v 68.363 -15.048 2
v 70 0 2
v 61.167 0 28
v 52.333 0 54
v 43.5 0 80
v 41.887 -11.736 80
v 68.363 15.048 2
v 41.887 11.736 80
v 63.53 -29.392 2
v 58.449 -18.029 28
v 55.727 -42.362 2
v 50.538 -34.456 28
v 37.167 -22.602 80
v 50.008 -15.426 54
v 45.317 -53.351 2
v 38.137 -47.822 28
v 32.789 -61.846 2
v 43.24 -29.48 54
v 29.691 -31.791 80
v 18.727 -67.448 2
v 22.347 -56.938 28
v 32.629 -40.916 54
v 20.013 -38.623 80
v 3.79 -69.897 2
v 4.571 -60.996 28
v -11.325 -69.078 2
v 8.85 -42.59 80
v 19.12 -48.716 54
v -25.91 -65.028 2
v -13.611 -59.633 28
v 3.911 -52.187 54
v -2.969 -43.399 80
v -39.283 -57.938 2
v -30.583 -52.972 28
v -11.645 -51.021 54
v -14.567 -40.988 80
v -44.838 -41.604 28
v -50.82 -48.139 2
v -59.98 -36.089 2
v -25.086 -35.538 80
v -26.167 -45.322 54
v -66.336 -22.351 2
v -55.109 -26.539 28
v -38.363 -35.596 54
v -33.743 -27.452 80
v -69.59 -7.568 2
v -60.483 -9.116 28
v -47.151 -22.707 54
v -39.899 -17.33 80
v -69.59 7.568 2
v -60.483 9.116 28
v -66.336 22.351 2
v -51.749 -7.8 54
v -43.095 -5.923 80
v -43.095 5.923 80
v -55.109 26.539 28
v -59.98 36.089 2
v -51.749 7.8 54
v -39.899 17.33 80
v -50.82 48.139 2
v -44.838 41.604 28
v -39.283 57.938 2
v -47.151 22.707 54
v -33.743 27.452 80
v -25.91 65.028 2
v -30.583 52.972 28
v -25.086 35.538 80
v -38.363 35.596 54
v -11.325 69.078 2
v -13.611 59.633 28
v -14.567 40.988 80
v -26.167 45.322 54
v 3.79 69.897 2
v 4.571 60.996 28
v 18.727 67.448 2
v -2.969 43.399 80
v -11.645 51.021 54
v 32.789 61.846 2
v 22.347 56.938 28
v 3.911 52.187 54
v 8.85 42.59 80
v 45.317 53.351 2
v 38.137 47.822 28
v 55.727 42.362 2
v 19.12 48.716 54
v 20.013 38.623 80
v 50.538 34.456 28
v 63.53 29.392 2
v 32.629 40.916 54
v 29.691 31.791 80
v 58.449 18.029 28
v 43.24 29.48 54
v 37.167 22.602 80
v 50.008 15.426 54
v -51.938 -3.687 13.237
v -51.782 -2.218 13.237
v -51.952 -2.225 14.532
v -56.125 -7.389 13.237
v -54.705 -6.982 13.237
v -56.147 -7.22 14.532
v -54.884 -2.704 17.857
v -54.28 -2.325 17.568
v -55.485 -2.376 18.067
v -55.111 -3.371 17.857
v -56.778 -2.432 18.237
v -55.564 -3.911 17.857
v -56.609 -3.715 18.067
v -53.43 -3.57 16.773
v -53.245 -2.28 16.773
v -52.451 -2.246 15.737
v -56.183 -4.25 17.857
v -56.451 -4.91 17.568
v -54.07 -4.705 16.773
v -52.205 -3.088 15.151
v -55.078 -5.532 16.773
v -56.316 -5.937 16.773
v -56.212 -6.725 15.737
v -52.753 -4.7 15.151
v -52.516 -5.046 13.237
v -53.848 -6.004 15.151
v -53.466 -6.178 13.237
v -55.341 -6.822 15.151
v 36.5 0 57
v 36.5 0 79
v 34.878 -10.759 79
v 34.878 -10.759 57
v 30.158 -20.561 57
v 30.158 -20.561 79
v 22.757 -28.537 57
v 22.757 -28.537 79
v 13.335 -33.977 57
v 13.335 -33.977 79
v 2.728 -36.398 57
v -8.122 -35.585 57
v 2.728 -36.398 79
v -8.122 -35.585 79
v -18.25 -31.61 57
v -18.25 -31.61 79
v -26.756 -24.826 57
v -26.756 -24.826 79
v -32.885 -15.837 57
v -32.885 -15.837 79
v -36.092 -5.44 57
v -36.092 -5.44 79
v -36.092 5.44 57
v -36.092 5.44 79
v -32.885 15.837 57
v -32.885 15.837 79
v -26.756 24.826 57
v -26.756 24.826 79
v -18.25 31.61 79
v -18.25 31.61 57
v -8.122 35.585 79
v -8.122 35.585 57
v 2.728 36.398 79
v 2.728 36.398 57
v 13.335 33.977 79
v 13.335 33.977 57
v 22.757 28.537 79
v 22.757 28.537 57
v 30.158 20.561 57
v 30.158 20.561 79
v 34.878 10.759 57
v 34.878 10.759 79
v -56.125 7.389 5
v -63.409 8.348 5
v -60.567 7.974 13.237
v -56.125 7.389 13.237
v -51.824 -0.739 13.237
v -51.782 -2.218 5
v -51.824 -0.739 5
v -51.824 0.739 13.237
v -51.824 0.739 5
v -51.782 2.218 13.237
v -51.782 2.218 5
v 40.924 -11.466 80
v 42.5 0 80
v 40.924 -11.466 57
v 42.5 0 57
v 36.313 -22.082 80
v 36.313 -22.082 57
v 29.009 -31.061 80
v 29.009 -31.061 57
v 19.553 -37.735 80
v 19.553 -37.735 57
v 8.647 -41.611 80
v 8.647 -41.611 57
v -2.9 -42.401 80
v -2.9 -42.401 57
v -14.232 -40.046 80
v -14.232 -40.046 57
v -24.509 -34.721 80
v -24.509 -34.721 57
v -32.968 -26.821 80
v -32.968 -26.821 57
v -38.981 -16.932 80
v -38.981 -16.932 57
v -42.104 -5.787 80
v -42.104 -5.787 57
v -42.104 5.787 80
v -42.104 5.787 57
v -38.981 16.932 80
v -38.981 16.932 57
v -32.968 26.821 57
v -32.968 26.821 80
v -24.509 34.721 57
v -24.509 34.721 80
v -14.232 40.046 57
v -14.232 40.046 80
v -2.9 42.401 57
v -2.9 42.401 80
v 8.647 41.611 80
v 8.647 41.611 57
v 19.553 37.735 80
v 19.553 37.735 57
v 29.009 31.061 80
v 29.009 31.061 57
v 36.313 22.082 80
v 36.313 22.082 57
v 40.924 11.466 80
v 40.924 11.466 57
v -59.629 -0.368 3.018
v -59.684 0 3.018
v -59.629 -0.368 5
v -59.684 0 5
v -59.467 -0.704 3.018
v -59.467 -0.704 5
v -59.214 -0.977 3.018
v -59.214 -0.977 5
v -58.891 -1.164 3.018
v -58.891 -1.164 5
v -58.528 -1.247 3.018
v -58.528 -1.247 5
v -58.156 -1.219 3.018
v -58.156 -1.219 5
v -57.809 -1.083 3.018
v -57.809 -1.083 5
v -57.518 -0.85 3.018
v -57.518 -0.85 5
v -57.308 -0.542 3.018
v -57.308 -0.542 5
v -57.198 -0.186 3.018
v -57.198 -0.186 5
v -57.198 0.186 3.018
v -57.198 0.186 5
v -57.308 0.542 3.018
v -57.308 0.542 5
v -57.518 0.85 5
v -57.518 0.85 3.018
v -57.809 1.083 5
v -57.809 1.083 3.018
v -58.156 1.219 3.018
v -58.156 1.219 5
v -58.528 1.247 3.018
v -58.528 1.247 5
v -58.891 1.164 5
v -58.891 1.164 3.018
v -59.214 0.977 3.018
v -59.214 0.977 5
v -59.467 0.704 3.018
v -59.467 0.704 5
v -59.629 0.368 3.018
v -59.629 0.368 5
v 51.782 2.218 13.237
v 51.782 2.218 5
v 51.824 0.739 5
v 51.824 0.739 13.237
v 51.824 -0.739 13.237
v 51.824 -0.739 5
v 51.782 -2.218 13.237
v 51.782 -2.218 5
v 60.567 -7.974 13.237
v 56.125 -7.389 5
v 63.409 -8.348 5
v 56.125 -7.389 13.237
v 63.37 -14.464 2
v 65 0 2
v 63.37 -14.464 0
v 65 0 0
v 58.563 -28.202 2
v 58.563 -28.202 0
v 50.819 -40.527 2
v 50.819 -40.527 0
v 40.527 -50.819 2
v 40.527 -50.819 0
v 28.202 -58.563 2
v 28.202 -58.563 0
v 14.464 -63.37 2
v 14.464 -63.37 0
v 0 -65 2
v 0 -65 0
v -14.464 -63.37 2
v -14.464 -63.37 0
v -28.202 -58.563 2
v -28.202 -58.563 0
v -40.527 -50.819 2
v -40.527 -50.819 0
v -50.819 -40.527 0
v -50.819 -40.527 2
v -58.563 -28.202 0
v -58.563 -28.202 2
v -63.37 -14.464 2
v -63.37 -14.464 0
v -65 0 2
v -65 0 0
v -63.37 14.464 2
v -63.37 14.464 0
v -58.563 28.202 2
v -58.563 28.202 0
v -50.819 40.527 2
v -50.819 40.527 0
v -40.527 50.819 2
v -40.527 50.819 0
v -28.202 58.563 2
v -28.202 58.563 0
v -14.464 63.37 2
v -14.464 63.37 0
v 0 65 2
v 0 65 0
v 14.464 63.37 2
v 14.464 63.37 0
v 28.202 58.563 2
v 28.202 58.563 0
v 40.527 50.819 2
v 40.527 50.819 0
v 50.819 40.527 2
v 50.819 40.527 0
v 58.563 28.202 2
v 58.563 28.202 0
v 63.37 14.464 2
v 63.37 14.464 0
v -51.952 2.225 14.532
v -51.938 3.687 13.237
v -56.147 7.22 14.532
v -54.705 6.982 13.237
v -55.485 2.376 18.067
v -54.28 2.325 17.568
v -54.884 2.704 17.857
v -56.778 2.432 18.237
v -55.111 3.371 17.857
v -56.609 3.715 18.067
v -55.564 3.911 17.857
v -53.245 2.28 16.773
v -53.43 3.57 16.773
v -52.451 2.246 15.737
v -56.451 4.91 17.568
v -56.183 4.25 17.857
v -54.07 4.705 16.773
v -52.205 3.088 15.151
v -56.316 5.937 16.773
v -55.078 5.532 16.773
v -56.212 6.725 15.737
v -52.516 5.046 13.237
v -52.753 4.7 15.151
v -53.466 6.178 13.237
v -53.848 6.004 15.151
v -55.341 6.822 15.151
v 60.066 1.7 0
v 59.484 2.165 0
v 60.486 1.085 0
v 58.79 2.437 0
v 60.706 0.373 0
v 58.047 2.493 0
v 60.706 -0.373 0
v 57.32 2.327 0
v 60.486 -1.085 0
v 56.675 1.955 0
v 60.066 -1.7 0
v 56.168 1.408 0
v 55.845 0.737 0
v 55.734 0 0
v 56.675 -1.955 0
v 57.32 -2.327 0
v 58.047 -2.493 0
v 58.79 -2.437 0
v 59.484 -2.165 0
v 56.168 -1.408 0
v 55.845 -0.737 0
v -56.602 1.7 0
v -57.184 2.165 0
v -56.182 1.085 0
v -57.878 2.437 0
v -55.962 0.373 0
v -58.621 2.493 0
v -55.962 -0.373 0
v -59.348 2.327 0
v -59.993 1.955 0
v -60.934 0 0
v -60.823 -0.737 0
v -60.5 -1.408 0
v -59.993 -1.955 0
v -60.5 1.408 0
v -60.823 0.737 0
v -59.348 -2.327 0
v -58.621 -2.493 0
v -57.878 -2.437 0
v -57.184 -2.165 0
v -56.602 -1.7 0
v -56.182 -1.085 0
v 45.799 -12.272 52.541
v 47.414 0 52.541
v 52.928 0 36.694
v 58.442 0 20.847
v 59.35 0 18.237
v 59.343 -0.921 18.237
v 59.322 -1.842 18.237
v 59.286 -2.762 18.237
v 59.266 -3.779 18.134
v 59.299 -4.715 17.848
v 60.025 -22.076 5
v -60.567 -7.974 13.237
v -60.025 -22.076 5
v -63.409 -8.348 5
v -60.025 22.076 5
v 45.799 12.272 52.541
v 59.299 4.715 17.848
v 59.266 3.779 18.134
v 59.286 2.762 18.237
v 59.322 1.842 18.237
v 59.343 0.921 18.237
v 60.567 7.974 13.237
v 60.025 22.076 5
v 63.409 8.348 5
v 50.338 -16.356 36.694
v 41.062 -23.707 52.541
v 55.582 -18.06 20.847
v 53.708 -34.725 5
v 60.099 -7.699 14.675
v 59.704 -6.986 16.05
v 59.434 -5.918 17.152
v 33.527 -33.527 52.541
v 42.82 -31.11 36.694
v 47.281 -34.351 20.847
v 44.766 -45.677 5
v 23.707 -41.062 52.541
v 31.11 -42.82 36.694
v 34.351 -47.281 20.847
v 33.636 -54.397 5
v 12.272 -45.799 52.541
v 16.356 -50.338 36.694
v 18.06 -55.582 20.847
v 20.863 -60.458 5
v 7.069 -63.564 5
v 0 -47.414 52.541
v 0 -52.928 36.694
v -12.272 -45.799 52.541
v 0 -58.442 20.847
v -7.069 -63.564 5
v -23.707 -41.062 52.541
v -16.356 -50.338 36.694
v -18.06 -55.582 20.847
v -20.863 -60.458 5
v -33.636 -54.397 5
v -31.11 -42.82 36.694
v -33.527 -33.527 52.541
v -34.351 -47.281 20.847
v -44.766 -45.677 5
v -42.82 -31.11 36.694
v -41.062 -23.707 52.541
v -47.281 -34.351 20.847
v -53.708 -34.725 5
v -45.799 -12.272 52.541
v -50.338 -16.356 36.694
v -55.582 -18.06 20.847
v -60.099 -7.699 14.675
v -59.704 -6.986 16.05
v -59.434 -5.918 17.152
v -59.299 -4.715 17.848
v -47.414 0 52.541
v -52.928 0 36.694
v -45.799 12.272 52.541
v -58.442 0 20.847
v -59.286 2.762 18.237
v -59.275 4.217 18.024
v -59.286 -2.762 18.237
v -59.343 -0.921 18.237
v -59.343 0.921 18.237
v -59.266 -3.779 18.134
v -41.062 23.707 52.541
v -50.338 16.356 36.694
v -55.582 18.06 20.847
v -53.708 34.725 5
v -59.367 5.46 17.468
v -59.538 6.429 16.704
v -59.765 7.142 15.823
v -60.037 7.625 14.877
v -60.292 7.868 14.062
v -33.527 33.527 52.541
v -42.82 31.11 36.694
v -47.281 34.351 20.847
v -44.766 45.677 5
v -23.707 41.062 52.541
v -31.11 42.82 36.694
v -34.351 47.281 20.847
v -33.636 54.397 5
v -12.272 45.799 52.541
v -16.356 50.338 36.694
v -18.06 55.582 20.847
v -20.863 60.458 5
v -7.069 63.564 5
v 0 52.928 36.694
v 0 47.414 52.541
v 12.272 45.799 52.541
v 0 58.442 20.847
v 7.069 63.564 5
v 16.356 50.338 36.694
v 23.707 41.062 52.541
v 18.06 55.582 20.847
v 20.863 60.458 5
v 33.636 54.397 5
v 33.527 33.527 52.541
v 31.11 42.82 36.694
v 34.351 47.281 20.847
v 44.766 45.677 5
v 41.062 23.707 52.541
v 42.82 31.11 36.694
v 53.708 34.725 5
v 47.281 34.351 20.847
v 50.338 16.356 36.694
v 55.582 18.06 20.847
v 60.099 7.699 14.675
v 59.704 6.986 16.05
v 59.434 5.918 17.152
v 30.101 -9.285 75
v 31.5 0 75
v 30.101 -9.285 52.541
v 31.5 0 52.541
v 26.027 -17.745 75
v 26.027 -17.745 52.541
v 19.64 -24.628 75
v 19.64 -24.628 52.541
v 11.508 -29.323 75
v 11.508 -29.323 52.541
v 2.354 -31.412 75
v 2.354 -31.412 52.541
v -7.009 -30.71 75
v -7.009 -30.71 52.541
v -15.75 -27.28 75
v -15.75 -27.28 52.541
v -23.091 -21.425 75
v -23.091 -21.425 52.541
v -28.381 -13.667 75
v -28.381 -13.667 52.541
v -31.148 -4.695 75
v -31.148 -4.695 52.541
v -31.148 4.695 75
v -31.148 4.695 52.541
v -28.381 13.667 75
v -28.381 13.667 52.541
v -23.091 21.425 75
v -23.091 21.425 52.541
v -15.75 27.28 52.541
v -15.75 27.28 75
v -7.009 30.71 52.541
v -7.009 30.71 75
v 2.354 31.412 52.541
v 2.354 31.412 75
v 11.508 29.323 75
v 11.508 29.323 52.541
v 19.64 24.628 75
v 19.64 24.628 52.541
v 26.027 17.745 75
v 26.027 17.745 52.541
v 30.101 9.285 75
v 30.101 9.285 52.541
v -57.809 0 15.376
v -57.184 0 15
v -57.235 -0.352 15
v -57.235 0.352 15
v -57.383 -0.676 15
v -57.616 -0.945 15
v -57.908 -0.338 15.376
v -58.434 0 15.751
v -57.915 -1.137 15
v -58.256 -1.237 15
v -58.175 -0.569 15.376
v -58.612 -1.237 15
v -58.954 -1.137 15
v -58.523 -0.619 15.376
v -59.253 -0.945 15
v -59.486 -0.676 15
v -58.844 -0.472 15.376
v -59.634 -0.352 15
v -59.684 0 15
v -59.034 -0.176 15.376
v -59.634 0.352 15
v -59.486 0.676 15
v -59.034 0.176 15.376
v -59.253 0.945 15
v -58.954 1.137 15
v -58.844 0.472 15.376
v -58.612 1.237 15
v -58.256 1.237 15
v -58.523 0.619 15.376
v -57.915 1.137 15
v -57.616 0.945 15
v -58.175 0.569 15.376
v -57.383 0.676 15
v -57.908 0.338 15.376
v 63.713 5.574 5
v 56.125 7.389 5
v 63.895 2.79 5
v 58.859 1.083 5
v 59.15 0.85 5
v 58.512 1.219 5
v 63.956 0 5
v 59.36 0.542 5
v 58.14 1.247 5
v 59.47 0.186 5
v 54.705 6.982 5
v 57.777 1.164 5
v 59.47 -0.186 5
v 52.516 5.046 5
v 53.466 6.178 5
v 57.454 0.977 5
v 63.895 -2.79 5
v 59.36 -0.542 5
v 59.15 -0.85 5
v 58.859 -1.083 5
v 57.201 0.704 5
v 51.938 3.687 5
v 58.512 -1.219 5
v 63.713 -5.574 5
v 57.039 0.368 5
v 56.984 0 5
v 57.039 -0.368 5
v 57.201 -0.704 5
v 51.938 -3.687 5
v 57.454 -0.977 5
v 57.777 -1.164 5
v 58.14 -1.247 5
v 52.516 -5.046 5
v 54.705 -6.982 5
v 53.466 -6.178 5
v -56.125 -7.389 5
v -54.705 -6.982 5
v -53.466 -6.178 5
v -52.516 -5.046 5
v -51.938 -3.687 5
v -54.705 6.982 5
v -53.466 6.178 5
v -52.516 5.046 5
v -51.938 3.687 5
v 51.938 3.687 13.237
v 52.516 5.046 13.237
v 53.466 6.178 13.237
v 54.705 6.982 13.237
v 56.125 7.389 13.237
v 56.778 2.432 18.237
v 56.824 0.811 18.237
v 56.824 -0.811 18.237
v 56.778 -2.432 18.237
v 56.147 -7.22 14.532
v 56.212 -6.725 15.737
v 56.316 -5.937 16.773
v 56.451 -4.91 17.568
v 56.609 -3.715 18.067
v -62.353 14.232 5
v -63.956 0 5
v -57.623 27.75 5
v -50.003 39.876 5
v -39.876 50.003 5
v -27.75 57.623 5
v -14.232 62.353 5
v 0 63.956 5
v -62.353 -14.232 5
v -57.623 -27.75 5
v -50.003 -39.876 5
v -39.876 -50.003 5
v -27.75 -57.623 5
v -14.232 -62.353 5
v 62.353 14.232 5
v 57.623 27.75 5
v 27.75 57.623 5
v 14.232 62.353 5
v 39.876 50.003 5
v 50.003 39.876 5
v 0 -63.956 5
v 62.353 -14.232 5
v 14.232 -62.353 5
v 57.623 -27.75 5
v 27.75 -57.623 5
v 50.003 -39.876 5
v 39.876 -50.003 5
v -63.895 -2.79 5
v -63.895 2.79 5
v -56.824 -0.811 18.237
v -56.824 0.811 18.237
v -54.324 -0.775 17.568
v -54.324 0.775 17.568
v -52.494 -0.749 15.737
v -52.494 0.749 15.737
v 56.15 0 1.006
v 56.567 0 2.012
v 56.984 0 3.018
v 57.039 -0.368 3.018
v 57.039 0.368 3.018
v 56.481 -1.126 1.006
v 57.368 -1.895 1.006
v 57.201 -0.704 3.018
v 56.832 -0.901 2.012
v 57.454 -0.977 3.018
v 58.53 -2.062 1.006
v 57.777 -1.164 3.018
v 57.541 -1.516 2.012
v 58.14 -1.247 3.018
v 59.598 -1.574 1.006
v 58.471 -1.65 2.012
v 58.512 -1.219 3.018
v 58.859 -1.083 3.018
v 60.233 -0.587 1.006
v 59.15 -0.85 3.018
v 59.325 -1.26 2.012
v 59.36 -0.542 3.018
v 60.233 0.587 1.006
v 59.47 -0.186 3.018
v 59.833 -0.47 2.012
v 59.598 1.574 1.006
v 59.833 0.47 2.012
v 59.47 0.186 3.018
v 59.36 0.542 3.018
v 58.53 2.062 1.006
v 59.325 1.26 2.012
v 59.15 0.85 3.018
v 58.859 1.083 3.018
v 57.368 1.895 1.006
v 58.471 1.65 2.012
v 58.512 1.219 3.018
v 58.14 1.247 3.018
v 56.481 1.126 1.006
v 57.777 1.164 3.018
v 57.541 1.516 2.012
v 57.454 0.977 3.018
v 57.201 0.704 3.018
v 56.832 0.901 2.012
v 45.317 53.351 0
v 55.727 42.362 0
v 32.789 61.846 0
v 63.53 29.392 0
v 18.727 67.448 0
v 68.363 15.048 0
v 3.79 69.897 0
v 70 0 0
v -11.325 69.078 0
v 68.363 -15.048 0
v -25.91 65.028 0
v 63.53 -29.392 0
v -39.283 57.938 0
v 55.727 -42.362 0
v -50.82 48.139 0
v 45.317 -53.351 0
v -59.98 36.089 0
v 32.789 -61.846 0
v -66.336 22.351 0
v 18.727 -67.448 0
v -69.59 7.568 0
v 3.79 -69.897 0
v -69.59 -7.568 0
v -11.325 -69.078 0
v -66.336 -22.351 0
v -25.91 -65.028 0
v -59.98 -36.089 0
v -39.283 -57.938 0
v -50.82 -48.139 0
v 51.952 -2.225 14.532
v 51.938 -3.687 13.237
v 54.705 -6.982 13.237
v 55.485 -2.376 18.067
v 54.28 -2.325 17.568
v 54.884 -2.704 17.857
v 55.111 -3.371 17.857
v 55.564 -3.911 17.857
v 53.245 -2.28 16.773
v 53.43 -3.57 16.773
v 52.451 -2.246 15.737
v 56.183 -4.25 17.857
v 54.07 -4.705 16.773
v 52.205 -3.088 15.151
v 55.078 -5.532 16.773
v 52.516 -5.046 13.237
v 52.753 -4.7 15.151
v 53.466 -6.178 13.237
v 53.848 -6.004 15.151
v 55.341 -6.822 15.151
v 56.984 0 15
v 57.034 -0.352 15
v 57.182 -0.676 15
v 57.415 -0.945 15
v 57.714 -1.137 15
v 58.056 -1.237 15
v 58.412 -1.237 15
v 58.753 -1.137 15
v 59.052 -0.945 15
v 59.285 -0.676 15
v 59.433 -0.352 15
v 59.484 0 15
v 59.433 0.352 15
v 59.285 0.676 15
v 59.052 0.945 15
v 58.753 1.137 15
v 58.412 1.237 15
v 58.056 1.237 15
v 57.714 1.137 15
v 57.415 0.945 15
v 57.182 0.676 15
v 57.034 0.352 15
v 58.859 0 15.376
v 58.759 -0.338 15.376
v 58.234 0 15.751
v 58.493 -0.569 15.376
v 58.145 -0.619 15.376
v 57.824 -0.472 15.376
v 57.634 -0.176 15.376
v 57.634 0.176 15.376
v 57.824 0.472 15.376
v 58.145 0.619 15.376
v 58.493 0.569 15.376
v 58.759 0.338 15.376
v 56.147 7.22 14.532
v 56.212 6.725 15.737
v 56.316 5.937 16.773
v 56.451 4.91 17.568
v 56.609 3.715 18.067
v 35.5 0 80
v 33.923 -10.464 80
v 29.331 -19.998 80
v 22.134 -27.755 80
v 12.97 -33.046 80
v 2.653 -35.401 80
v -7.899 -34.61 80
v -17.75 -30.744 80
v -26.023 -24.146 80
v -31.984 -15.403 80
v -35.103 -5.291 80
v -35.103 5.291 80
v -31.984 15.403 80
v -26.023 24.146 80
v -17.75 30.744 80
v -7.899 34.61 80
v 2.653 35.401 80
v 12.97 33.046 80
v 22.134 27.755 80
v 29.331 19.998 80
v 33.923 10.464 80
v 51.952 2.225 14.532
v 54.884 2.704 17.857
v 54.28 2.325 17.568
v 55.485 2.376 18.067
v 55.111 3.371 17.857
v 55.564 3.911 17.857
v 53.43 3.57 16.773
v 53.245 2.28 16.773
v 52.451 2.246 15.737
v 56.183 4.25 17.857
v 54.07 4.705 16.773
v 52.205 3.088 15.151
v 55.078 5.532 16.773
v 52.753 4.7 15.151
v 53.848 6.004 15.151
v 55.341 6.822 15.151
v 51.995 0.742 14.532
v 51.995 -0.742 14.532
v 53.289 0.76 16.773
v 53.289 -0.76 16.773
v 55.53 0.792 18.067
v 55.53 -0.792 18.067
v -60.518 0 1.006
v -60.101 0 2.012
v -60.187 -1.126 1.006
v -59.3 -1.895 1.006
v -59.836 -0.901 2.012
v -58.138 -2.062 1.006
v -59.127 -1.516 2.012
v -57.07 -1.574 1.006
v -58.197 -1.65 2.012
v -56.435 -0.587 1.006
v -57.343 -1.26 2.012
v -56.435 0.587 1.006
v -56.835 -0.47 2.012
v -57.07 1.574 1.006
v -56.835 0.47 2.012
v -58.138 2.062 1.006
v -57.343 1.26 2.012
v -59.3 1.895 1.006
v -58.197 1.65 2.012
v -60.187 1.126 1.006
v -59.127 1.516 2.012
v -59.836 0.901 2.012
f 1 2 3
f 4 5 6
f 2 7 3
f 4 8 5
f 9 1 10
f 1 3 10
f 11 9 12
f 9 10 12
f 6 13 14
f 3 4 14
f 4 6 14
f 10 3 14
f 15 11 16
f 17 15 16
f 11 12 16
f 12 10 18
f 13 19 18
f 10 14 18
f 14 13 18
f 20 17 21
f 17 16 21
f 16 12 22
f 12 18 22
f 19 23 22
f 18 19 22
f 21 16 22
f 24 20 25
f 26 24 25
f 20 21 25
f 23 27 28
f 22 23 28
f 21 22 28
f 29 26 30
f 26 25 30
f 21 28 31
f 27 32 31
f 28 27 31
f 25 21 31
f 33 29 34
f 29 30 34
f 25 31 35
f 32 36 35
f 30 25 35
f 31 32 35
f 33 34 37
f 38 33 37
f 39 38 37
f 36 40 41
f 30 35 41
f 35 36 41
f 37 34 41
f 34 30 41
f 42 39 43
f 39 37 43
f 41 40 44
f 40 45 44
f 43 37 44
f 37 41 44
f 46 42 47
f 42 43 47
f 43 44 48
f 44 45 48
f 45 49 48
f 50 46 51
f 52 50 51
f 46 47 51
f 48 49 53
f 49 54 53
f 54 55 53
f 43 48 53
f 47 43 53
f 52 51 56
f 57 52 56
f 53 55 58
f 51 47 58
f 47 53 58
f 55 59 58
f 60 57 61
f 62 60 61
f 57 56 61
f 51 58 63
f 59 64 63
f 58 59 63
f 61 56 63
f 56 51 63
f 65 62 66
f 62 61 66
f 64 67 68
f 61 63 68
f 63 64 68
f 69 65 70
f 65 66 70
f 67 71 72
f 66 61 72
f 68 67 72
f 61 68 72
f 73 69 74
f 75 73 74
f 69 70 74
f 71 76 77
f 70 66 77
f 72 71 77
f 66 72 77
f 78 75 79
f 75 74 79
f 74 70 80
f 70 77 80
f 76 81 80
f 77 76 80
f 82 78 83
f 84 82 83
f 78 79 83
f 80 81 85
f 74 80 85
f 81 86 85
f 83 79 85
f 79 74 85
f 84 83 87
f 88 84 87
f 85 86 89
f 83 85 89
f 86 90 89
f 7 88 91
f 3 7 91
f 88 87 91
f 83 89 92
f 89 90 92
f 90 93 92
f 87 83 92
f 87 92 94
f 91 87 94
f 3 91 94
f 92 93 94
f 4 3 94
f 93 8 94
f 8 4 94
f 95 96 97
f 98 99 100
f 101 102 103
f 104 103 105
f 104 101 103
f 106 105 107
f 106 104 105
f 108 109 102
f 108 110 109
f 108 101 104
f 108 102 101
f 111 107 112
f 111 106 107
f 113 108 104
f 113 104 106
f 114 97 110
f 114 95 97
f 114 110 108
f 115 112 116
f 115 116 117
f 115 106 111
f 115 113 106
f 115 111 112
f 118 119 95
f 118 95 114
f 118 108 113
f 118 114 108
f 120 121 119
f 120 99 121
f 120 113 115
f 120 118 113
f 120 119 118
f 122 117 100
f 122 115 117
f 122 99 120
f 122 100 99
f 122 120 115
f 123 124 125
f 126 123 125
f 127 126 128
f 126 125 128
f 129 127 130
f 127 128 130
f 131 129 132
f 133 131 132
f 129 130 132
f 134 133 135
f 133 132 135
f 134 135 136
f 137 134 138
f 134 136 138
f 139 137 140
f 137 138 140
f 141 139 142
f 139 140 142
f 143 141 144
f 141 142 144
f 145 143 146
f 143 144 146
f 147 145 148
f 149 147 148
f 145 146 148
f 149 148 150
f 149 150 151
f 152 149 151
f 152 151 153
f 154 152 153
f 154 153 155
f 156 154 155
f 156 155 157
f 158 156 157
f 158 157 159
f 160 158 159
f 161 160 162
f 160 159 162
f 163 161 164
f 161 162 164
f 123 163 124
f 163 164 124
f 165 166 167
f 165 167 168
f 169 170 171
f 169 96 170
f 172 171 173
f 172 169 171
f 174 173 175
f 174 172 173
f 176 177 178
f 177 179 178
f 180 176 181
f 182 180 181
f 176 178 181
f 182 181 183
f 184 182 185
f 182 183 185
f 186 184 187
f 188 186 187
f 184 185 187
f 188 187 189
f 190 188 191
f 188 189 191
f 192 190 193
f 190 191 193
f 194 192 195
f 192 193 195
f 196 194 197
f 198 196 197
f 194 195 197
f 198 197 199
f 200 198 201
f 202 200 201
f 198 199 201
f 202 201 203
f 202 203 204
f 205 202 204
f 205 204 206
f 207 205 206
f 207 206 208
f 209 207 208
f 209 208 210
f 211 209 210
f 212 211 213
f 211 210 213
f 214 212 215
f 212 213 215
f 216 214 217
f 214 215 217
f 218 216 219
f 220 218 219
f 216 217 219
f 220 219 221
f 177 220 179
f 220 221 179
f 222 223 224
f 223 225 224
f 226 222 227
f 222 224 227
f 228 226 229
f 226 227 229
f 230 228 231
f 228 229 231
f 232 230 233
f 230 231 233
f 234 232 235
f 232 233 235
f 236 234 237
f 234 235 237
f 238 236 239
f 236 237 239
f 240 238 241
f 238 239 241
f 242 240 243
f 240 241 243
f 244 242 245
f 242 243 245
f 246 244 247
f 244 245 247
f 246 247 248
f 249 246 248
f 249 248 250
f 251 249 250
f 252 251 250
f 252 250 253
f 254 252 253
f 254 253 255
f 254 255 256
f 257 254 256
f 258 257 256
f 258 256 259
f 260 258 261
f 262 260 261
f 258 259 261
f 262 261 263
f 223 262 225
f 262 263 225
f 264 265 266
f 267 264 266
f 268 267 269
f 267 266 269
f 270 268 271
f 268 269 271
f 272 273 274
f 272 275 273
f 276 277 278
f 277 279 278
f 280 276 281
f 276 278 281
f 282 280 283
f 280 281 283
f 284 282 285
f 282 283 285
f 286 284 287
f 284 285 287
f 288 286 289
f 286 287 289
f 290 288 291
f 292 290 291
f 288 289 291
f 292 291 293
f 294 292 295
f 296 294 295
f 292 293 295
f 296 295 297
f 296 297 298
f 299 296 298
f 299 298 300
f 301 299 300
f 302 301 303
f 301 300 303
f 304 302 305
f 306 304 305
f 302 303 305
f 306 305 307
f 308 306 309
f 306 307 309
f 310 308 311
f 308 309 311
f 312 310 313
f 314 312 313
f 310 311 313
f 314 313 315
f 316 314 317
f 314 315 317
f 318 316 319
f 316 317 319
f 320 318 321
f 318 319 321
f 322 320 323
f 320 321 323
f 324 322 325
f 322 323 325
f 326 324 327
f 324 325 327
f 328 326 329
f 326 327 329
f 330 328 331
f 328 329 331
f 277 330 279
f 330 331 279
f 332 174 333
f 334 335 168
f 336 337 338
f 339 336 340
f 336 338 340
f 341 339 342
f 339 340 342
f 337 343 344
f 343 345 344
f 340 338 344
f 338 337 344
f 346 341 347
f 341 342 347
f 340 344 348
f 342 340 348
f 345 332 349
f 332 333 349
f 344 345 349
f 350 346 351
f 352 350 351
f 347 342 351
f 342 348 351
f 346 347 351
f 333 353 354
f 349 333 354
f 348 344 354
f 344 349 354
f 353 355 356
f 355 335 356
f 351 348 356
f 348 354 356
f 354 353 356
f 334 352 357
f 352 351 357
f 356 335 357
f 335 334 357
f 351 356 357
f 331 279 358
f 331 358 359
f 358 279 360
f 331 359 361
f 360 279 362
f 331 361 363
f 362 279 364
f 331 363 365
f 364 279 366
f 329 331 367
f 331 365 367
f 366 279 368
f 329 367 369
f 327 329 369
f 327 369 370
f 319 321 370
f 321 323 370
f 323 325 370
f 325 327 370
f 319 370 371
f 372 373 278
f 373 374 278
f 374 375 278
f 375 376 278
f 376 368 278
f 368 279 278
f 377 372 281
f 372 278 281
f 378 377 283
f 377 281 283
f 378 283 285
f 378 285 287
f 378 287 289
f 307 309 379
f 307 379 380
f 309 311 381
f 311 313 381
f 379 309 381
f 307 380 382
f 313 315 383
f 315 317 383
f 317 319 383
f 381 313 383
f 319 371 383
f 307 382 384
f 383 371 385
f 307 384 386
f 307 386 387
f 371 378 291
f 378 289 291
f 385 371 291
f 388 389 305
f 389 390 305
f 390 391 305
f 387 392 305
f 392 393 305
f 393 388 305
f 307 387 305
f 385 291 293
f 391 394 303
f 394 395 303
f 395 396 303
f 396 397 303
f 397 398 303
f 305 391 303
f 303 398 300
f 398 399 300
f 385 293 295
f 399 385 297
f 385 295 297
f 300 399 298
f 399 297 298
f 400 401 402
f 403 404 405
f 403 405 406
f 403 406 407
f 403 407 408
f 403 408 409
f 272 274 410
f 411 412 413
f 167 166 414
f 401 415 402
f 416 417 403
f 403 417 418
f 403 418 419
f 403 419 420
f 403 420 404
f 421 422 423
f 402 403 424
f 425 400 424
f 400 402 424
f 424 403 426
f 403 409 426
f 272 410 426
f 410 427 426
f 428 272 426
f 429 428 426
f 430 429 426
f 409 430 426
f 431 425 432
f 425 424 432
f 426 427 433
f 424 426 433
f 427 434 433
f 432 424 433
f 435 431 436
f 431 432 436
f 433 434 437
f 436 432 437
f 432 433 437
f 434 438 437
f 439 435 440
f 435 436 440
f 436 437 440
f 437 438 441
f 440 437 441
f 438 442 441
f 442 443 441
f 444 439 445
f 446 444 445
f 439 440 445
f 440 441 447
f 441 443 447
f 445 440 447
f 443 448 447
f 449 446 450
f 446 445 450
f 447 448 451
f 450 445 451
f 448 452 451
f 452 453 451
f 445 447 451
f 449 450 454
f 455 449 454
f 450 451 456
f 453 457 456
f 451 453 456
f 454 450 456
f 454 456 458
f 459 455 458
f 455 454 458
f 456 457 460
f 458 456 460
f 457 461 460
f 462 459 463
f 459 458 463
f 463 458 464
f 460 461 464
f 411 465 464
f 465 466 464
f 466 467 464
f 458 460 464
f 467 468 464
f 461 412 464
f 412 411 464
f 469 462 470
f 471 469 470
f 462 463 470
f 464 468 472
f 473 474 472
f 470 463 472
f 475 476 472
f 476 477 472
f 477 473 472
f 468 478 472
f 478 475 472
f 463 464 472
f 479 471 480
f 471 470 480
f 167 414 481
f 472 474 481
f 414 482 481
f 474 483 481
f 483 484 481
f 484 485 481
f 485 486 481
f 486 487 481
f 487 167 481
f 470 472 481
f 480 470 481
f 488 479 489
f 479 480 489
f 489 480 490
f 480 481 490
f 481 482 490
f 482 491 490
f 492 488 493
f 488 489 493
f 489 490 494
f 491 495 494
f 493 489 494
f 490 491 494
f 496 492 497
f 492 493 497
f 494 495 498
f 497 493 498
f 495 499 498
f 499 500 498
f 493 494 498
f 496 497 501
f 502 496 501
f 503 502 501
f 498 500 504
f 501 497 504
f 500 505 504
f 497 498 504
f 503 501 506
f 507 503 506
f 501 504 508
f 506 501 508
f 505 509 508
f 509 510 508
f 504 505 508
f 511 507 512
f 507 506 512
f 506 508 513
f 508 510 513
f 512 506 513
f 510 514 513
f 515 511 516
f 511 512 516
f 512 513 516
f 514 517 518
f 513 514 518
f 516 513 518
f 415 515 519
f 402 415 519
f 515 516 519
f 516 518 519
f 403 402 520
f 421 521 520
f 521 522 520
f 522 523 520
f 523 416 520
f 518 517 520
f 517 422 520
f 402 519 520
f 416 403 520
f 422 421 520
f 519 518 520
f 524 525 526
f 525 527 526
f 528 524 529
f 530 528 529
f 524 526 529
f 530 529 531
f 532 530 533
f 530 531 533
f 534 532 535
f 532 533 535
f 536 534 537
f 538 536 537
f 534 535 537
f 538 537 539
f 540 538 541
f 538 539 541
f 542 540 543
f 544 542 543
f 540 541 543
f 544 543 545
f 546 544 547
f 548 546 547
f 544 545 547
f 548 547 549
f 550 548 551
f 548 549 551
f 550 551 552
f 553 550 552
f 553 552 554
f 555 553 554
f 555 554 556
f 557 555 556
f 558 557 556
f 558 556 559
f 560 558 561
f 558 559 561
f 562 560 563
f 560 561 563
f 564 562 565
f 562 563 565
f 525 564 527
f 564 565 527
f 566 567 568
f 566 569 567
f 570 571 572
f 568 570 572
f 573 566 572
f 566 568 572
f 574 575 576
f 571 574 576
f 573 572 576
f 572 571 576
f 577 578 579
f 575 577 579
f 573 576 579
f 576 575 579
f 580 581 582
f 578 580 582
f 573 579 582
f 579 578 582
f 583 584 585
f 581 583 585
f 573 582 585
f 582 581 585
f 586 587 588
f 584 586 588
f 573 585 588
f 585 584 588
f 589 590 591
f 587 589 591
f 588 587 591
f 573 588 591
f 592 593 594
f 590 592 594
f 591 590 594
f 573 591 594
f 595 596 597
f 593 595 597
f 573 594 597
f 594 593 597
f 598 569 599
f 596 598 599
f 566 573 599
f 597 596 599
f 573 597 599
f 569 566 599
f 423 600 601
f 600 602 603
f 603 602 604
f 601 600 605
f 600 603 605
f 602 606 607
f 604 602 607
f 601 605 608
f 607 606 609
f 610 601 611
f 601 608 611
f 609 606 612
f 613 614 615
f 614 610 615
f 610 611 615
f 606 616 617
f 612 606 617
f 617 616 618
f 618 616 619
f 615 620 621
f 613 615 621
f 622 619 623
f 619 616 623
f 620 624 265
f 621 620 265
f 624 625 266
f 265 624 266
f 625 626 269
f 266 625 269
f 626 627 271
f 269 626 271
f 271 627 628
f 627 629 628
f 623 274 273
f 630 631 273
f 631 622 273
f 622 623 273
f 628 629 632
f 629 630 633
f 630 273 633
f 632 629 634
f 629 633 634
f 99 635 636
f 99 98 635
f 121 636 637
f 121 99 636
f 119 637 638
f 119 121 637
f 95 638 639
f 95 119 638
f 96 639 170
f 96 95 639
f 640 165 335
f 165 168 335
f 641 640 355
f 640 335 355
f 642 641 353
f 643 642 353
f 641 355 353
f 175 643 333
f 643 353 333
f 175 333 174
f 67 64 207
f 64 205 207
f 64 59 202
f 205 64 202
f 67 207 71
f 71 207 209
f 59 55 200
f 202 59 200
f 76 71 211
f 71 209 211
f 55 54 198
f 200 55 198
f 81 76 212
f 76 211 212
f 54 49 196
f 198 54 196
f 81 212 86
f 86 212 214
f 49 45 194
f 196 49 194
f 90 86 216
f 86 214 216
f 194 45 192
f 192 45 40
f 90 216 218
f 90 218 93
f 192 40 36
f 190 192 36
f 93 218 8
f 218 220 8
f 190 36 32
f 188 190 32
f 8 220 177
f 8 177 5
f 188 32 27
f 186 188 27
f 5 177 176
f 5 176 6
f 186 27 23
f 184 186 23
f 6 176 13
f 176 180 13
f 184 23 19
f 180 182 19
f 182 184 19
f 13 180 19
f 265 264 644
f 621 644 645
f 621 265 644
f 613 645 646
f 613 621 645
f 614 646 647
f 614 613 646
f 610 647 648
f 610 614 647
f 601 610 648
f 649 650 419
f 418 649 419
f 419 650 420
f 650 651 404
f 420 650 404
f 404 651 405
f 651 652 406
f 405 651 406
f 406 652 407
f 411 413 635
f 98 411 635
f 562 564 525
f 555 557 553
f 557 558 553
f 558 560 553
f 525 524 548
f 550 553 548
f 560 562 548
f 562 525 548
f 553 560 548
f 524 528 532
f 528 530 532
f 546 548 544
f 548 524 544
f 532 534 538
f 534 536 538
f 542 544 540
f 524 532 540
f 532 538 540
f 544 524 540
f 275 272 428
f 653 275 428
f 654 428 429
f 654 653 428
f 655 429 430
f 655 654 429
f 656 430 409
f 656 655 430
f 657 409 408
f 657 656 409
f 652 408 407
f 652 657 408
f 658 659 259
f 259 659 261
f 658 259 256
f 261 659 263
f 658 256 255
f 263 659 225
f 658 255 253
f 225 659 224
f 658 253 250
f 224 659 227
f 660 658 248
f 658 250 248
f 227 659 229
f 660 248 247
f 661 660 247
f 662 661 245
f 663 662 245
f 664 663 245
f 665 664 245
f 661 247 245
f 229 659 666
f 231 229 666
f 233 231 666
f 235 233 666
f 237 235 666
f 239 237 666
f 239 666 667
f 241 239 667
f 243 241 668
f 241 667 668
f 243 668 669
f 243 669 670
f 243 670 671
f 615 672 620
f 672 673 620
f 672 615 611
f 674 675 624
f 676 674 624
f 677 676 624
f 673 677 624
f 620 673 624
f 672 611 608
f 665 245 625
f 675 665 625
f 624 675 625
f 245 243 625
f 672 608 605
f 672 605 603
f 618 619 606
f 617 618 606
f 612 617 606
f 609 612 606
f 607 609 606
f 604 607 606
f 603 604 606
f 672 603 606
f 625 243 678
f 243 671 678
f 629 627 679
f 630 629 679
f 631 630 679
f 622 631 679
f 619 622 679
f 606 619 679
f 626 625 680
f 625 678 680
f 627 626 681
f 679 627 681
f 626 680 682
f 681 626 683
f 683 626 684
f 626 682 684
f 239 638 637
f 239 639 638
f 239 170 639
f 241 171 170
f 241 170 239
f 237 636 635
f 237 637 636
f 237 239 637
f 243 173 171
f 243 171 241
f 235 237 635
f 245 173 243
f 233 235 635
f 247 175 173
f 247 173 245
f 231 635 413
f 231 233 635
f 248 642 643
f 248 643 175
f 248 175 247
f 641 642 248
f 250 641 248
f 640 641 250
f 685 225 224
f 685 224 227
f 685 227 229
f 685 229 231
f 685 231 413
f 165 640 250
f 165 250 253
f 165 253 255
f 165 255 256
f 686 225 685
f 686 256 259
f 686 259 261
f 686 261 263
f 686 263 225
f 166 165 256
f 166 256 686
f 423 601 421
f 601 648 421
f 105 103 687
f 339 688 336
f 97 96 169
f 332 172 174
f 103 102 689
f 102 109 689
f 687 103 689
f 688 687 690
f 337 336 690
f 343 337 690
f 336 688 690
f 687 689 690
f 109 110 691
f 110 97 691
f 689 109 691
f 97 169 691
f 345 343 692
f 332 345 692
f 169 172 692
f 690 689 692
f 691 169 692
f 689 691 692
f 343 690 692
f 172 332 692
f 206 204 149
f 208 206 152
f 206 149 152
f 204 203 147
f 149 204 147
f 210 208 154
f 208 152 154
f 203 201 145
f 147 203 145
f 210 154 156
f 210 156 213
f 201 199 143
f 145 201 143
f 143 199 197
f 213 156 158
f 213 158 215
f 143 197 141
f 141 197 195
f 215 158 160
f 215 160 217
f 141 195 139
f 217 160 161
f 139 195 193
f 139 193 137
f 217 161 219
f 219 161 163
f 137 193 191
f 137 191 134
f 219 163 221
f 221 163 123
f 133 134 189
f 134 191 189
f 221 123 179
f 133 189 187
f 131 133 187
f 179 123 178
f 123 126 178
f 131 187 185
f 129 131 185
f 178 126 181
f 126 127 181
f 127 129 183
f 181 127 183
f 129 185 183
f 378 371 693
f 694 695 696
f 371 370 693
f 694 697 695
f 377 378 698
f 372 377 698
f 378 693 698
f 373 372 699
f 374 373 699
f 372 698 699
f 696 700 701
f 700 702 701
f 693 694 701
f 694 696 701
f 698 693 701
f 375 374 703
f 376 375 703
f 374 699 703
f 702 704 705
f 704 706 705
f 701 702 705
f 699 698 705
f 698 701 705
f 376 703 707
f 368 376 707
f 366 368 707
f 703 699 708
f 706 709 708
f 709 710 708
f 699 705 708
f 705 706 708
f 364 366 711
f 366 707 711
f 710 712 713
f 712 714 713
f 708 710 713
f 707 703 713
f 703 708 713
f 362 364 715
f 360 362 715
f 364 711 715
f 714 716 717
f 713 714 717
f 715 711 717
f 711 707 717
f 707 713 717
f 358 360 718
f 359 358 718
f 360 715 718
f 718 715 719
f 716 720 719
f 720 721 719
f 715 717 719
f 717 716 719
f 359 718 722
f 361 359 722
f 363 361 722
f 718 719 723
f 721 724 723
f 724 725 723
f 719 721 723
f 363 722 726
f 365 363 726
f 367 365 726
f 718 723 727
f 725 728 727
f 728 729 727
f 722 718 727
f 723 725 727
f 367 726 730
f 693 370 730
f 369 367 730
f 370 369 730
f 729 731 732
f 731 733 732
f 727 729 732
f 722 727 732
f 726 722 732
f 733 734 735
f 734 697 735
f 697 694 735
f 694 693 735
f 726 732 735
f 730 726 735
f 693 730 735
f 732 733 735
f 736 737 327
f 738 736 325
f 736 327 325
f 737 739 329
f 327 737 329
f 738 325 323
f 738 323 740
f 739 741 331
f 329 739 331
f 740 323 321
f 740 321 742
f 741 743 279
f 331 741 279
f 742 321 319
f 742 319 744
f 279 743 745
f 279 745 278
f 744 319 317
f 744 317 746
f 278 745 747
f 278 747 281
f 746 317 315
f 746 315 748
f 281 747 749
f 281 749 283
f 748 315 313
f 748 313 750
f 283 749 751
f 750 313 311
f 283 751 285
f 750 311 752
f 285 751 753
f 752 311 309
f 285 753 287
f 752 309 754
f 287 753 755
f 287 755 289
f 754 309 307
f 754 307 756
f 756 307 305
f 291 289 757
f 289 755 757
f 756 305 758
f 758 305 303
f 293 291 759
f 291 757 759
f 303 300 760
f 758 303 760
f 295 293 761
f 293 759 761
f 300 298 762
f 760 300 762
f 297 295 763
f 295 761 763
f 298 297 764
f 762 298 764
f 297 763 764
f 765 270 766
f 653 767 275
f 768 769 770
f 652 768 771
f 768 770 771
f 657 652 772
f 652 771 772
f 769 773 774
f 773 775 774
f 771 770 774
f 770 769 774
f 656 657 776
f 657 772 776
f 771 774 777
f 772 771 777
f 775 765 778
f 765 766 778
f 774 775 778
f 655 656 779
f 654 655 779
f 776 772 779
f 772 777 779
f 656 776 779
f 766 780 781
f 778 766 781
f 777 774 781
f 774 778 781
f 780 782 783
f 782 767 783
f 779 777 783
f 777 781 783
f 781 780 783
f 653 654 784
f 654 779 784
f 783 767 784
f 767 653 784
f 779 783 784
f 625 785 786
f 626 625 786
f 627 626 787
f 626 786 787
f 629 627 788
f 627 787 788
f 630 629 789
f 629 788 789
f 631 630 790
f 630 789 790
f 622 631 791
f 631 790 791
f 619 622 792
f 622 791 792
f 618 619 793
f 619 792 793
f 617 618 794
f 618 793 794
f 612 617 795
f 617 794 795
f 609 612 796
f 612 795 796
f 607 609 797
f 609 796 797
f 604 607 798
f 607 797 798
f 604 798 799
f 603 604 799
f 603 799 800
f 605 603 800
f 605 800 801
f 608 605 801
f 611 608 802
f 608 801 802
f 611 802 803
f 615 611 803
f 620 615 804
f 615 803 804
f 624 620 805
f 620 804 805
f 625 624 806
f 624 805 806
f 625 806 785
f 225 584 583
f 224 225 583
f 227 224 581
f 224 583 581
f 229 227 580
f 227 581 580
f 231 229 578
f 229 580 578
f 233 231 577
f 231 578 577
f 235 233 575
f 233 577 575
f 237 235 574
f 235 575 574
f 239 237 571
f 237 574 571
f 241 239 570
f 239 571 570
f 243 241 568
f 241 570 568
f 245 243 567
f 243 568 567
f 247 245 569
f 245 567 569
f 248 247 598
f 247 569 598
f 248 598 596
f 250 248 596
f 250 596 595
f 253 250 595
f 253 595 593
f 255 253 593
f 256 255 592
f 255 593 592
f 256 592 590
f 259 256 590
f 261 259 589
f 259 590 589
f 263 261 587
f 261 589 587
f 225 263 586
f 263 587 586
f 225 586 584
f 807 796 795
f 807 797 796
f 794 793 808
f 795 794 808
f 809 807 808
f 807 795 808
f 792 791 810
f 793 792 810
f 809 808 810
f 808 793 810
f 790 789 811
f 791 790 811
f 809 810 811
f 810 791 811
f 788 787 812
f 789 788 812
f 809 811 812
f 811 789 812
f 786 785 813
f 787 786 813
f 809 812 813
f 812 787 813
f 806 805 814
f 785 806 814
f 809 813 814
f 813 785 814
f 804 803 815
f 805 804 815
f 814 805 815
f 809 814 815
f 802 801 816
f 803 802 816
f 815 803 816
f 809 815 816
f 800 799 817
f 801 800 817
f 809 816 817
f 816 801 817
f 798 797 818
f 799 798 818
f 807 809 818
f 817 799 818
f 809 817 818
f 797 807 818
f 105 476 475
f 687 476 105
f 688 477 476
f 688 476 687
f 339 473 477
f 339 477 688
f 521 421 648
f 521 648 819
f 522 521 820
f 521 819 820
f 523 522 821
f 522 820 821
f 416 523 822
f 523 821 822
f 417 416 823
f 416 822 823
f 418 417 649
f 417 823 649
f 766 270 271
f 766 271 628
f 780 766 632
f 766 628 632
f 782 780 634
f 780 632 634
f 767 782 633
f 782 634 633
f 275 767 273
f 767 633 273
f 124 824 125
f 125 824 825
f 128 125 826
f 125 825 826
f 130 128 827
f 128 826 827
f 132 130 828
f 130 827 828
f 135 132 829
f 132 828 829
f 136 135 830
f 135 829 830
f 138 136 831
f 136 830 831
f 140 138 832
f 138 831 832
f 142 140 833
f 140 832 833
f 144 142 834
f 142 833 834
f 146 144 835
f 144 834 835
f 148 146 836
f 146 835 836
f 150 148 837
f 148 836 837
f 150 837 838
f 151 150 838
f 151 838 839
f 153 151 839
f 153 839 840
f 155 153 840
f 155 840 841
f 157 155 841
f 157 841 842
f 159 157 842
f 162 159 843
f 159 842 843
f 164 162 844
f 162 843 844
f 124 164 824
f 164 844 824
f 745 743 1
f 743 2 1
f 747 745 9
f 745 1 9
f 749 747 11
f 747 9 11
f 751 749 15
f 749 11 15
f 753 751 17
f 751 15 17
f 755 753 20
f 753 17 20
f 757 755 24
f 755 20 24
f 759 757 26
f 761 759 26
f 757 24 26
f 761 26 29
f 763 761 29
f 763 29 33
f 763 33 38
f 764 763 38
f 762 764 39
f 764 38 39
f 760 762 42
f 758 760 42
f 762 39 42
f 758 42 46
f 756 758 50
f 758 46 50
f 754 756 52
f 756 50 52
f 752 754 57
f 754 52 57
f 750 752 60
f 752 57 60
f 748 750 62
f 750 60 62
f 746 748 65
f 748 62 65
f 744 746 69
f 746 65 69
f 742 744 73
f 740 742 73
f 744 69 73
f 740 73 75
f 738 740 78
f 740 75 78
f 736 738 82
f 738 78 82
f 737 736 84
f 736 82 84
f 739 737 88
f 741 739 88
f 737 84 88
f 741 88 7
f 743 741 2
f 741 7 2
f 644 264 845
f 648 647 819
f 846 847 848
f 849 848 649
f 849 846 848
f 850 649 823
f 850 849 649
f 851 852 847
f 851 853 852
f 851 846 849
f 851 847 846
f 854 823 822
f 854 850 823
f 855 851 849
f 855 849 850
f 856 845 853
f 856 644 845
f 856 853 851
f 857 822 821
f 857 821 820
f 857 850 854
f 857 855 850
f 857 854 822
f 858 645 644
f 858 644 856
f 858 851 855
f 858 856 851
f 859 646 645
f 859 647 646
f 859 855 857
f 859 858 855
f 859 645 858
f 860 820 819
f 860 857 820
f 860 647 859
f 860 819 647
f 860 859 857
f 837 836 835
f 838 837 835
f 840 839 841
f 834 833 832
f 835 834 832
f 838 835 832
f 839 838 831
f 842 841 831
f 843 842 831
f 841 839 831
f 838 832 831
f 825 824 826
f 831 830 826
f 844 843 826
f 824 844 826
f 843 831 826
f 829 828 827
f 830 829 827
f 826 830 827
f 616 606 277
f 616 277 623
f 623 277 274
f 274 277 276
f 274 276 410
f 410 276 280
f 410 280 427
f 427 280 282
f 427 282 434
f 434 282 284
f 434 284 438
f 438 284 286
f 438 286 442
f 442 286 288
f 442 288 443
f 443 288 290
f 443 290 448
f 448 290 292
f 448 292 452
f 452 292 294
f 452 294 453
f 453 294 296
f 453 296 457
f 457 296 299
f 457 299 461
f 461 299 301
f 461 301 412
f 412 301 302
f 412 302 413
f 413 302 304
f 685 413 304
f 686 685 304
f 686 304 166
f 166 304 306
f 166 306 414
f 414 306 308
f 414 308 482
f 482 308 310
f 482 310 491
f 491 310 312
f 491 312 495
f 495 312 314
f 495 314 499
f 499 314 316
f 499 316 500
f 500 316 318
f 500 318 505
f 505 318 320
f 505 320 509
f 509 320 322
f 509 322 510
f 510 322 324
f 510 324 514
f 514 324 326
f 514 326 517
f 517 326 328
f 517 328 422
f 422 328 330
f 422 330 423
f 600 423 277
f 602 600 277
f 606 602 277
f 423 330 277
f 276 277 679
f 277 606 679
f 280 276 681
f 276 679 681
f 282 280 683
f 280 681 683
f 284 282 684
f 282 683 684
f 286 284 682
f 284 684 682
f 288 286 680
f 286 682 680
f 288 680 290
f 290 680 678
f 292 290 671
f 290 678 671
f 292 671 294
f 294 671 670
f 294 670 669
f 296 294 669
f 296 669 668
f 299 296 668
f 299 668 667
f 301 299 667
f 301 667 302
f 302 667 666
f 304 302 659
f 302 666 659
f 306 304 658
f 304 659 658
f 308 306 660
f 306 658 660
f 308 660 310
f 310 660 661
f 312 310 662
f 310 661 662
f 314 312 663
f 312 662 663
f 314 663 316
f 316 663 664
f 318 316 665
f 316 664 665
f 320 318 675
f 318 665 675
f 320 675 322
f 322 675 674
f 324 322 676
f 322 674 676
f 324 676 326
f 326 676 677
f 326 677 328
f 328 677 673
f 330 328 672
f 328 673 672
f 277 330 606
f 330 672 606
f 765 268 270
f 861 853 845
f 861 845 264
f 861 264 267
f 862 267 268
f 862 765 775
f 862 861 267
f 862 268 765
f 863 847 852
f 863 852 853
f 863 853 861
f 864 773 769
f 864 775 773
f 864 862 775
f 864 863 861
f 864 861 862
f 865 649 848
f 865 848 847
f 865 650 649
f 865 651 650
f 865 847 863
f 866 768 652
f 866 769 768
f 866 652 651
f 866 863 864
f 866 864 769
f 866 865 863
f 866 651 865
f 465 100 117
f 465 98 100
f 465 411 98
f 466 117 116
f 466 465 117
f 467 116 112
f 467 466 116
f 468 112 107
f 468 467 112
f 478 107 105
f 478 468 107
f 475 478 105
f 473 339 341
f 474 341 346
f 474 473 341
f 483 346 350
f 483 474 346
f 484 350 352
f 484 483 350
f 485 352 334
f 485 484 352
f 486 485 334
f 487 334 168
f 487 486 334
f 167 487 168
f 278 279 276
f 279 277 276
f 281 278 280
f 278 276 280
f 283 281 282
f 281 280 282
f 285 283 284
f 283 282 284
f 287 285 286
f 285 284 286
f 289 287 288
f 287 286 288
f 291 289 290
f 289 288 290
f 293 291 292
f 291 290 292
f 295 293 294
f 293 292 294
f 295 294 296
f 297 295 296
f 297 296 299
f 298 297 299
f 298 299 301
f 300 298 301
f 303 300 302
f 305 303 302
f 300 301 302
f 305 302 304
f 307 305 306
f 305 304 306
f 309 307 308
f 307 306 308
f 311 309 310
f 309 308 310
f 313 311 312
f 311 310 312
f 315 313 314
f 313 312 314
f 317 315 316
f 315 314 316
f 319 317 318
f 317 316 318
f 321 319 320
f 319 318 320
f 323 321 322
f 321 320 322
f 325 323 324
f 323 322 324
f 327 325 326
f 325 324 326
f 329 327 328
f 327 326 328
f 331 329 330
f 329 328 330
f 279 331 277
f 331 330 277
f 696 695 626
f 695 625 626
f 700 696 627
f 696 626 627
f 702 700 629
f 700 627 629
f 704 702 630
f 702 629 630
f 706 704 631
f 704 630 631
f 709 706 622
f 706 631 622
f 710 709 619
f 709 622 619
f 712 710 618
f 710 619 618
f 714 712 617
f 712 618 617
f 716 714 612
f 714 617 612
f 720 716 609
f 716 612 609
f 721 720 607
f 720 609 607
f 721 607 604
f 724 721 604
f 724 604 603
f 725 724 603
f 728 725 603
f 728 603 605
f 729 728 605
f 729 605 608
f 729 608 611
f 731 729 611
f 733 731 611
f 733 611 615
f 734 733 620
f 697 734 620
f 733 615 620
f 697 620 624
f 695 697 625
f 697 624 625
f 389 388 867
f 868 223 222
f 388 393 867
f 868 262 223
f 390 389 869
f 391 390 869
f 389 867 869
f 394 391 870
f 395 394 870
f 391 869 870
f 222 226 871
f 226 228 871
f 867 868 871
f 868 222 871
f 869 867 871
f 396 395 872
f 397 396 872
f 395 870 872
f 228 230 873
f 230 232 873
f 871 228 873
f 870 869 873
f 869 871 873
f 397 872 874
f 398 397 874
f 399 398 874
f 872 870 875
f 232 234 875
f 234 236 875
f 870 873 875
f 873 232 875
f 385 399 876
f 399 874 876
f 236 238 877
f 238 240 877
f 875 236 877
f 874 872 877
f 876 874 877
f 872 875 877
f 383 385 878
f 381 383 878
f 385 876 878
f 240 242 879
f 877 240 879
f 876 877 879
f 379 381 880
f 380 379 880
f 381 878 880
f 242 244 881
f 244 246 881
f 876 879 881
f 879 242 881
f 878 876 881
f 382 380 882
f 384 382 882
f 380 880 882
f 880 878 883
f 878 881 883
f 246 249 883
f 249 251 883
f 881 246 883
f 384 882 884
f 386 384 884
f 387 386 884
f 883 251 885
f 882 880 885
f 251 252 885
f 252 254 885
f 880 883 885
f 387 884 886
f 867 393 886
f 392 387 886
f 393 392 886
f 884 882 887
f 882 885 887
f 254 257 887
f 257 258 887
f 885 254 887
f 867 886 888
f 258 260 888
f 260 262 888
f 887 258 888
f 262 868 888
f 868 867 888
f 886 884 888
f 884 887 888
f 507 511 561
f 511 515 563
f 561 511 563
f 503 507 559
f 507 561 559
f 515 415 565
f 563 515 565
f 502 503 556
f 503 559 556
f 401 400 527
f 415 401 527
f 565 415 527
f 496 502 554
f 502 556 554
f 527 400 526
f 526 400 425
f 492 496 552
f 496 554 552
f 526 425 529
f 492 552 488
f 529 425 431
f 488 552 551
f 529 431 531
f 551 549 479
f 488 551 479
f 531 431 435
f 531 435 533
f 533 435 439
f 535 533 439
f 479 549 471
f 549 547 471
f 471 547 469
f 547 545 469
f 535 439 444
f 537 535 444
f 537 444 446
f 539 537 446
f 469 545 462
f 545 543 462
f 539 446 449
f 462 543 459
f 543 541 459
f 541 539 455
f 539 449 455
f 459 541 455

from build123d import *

# Parameters (mm, degrees)
F2_SIZE          = 1
F4_ANGLE_BACK    = 7.5
F4_ANGLE         = 15
F5_ANGLE_BACK    = 7.5
F5_ANGLE         = 15
F7_D             = 2.5
F7_DEPTH         = 15
F7_CSINK_D       = 5
F7_CSINK_ANGLE   = 45
F7_TIP           = 0.7510757738
F7_2_D           = 2.5
F7_2_DEPTH       = 15
F7_2_CSINK_D     = 5
F7_2_CSINK_ANGLE = 45
F7_2_TIP         = 0.7510757738
F8_R             = 5


with BuildPart() as f1:
    # F0 (on Front) → F1 (revolve)
    with BuildSketch(Plane.XZ):
        Polygon((70, 2), (43.5, 80), (42.5, 80), (42.5, 57), (36.5, 57), (36.5, 80), (31.5, 80), (0, 80), (0, 75), (31.5, 75), (31.5, 57), (31.5, 52.5413967947), (47.414124012, 52.5413967947), (59.3501898877, 18.2374222869), (63.9561501797, 5), (65, 2), (65, 0), (70, 0), align=None)
    revolve(axis=Axis((0, 0, 40), (0, 0, -1)))

    # F2
    f2_edges = [f1.edges().sort_by_distance(p)[0] for p in [
        (-36.5, 0, 80),
    ]]
    chamfer(f2_edges, length=F2_SIZE)

    # F0 (on Front) → F4 (revolve)
    with BuildSketch(Plane.XZ, mode=Mode.PRIVATE) as f4_sk:
        Polygon((51.8297031522, 5), (63.9561501797, 5), (59.3501898877, 18.2374222869), (51.8297031522, 18.2374222869), align=None)
    revolve(f4_sk.sketch.rotate(Axis((0, 0, 40), (0, 0, -1)), -F4_ANGLE_BACK), axis=Axis((0, 0, 40), (0, 0, -1)), revolution_arc=F4_ANGLE)

    # F0 (on Front) → F5 (revolve)
    with BuildSketch(Plane.XZ, mode=Mode.PRIVATE) as f5_sk:
        Polygon((-63.9561501797, 5), (-51.8297031522, 5), (-51.8297031522, 18.2374222869), (-59.3501898877, 18.2374222869), align=None)
    revolve(f5_sk.sketch.rotate(Axis((0, 0, 40), (0, 0, -1)), -F5_ANGLE_BACK), axis=Axis((0, 0, 40), (0, 0, -1)), revolution_arc=F5_ANGLE)

    # F7
    with Locations(Plane(origin=(0, 0, 0), x_dir=(1, 0, 0), z_dir=(0, 0, -1))):
        with Locations((58.2336969674, 0), (-58.4342479706, 0)):
            CounterSinkHole(F7_D / 2, F7_CSINK_D / 2, depth=F7_DEPTH, counter_sink_angle=F7_CSINK_ANGLE)
            with Locations((0, 0, -(F7_DEPTH + F7_TIP / 2))):  # 118° drill point
                Cone(0, F7_D / 2, F7_TIP, mode=Mode.SUBTRACT)

    # F8
    f8_edges = [f1.edges().sort_by_distance(p)[0] for p in [
        (-51.386293, -6.765134, 11.618711),
        (-51.386293, 6.765134, 11.618711),
        (51.386293, -6.765134, 11.618711),
        (51.386293, 6.765134, 11.618711),
        (-51.829703, 0, 18.237422),
        (51.829703, 0, 18.237422),
        (55.114367, 7.255944, 18.237422),
        (55.114367, -7.255944, 18.237422),
        (-55.114367, -7.255944, 18.237422),
        (-55.114367, 7.255944, 18.237422),
    ]]
    fillet(f8_edges, radius=F8_R)


with BuildPart() as f3:
    # F0 (on Front) → F3 (revolve)
    with BuildSketch(Plane.XZ):
        Polygon((0, 0), (65, 0), (65, 2), (63.9561501797, 5), (51.8297031522, 5), (0, 5), align=None)
    revolve(axis=Axis((0, 0, 40), (0, 0, -1)))

    # F7#2
    with Locations(Plane(origin=(0, 0, 0), x_dir=(1, 0, 0), z_dir=(0, 0, -1))):
        with Locations((58.2336969674, 0), (-58.4342479706, 0)):
            CounterSinkHole(F7_2_D / 2, F7_2_CSINK_D / 2, depth=F7_2_DEPTH, counter_sink_angle=F7_2_CSINK_ANGLE)
            with Locations((0, 0, -(F7_2_DEPTH + F7_2_TIP / 2))):  # 118° drill point
                Cone(0, F7_2_D / 2, F7_2_TIP, mode=Mode.SUBTRACT)


solid = Compound([f1.part, f3.part])
